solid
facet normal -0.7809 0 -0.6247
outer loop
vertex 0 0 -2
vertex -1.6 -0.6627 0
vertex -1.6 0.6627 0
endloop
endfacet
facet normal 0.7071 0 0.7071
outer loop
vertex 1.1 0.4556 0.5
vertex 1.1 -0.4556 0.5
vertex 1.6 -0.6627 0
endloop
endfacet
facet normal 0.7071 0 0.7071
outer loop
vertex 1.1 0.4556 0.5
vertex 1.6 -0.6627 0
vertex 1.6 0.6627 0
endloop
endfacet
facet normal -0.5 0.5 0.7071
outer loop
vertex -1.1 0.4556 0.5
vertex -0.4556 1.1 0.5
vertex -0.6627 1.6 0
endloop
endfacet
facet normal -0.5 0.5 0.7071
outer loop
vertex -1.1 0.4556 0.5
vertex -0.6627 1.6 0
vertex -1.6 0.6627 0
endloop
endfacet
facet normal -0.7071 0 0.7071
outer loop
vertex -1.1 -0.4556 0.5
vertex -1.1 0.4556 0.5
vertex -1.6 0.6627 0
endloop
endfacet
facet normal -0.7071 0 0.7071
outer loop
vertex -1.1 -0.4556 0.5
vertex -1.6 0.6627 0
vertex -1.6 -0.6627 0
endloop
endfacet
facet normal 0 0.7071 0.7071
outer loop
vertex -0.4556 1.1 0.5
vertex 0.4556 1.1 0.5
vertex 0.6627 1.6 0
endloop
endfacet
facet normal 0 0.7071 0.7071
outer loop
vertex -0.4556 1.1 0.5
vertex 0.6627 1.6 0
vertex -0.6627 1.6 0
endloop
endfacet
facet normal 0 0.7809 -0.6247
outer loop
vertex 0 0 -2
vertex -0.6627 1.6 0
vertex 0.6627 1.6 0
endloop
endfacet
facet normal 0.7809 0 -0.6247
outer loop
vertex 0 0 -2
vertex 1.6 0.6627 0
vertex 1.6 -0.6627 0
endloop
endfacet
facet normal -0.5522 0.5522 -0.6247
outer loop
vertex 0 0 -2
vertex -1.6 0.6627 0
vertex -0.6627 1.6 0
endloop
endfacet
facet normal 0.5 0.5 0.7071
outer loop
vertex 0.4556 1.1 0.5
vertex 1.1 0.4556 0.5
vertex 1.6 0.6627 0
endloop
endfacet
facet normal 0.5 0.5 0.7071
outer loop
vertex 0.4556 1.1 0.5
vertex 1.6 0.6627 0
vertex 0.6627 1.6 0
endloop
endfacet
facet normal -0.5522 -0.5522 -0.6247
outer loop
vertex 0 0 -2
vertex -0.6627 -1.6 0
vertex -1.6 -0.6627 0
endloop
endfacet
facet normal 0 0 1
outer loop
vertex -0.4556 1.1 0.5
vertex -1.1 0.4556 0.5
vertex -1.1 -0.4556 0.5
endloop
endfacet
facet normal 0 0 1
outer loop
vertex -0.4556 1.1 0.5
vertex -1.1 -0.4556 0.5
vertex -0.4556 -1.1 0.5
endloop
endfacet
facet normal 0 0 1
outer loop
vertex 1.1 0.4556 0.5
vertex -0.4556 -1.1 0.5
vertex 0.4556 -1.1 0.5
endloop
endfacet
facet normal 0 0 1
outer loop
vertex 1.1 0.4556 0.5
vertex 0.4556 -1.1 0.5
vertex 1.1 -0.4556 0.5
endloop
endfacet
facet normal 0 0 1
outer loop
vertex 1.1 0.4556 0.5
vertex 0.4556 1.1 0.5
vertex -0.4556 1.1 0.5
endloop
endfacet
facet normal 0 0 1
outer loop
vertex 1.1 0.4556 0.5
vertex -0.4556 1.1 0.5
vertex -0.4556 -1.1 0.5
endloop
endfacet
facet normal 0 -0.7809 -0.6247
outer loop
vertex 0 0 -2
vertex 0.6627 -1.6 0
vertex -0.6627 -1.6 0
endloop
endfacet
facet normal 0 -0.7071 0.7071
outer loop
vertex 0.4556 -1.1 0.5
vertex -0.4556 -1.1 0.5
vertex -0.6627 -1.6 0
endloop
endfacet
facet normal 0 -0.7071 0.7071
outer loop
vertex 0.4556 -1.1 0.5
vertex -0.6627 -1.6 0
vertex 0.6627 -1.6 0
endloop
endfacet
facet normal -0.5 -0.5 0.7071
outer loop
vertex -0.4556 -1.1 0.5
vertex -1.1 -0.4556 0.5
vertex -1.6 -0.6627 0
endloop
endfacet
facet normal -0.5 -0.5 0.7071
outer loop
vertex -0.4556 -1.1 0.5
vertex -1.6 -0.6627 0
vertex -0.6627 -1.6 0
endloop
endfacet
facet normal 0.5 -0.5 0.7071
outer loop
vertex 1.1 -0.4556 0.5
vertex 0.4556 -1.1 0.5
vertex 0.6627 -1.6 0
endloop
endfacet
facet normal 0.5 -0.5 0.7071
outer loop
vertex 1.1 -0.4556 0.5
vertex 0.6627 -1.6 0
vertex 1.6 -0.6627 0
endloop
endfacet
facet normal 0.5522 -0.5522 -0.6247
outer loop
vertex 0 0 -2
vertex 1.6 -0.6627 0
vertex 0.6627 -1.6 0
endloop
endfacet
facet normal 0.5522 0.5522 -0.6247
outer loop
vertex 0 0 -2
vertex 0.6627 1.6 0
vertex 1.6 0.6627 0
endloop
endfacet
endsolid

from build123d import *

# Parameters (mm, degrees)
F1_DEPTH = 0.5
F2_SIZE2 = 0.49999
F2_SIZE  = 0.49999


# Not quite as in the source:
# - a fillet or chamfer is up to 0.001 mm smaller than in the source, because OpenCascade refuses the exact size


with BuildPart() as f1:
    # F0 (on Top) → F1 (new body)
    with BuildSketch(Plane.XY):
        Polygon((-1.6, 0.6627416998), (-1.6, -0.6627416998), (-0.6627416998, -1.6), (0.6627416998, -1.6), (1.6, -0.6627416998), (1.6, 0.6627416998), (0.6627416998, 1.6), (-0.6627416998, 1.6), align=None)
    extrude(amount=F1_DEPTH)

    # F2 (size 0.5 and 0.5 in the source; OpenCascade refuses exactly that, so slightly less here)
    f2_edges = [f1.edges().sort_by_distance(p)[0] for p in [
        (-1.131371, 1.131371, 0.5),
        (-1.6, 0, 0.5),
        (-1.131371, -1.131371, 0.5),
        (0, -1.6, 0.5),
        (1.131371, -1.131371, 0.5),
        (1.6, 0, 0.5),
        (1.131371, 1.131371, 0.5),
        (0, 1.6, 0.5),
    ]]
    chamfer(f2_edges, length=F2_SIZE, length2=F2_SIZE2)

    # F1_face (on face) → F5 section 0
    with BuildSketch(Plane(origin=(0, 0, 0), x_dir=(1, 0, 0), z_dir=(0, 0, -1)), mode=Mode.PRIVATE) as f5_s0:
        Polygon((-1.6, -0.6627416998), (-0.6627416998, -1.6), (0.6627416998, -1.6), (1.6, -0.6627416998), (1.6, 0.6627416998), (0.6627416998, 1.6), (-0.6627416998, 1.6), (-1.6, 0.6627416998), align=None)
    loft([f5_s0.sketch, Vertex(0, 0, -2)])


solid = f1.part
